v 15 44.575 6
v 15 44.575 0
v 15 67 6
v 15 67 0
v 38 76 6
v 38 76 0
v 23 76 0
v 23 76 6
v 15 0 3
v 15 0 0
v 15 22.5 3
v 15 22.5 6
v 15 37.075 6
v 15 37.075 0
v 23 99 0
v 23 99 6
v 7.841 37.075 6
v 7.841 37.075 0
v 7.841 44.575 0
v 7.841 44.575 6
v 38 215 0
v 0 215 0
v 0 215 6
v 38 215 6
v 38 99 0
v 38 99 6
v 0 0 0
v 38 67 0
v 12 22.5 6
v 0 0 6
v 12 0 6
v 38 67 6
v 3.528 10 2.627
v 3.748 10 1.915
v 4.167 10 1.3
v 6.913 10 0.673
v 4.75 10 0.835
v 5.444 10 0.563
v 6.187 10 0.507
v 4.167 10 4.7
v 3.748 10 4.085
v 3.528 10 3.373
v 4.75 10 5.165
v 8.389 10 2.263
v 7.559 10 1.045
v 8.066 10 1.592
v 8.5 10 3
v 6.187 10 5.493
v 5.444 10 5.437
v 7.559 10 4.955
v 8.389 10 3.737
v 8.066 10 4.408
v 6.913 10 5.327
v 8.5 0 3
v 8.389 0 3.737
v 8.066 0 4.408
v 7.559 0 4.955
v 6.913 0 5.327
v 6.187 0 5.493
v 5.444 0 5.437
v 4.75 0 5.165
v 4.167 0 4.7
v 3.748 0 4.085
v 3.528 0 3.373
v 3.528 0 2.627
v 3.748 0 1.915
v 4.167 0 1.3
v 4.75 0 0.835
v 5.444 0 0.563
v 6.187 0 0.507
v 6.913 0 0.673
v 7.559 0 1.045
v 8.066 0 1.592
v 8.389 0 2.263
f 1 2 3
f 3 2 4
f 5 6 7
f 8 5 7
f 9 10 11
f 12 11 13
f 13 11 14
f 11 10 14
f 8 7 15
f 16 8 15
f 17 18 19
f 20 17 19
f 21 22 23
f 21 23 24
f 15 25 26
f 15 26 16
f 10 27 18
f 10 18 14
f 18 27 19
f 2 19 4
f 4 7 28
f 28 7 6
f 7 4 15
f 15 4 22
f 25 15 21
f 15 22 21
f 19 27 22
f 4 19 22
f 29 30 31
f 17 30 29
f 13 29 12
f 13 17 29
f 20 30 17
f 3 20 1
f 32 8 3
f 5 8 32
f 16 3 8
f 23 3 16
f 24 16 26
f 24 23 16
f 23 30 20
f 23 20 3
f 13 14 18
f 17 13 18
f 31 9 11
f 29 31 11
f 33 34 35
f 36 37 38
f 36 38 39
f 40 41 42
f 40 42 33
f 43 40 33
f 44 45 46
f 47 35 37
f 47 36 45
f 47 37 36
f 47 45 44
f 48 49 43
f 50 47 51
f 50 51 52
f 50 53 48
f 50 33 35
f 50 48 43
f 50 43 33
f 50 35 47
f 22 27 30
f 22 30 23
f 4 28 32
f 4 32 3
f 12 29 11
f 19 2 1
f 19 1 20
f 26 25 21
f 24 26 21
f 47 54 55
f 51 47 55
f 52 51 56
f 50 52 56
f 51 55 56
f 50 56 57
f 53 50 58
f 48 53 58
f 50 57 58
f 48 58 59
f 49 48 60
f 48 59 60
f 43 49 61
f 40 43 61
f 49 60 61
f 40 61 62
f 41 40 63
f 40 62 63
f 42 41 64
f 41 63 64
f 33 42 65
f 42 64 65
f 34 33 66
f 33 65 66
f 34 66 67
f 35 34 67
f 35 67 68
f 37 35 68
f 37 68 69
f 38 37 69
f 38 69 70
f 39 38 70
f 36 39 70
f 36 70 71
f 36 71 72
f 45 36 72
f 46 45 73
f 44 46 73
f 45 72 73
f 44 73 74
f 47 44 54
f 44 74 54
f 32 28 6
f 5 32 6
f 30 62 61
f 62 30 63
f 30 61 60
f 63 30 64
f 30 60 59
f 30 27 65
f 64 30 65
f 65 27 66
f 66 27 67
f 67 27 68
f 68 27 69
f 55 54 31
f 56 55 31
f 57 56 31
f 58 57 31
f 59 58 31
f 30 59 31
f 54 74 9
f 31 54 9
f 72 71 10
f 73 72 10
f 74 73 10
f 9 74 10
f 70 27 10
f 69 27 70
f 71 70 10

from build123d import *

# Parameters (mm, degrees)
ESQUISSE1_W             = 38
ESQUISSE1_H             = 215
BOSS_EXTRU_1_DEPTH      = 6
ESQUISSE2_W             = 15
ESQUISSE2_H             = 23
ENL_V_MAT_EXTRU_1_DEPTH = 219.414743092
ESQUISSE3_W             = 20
ESQUISSE3_H             = 22.5
ENL_V_MAT_EXTRU_2_DEPTH = 7.5
CHANFREIN1_SIZE         = 6
ESQUISSE4_W             = 23
ESQUISSE4_H             = 67
ENL_V_MAT_EXTRU_3_DEPTH = 219.414743092
ESQUISSE5_W             = 7.158748458
ESQUISSE5_H             = 7.5
ENL_V_MAT_EXTRU_4_DEPTH = 219.414743092
ESQUISSE6_R             = 2.5
ENL_V_MAT_EXTRU_5_DEPTH = 10


with BuildPart() as part:
    # Esquisse1 → Boss.-Extru.1 (new body)
    with BuildSketch(Plane.XY):
        with Locations((19, 107.5)):
            Rectangle(ESQUISSE1_W, ESQUISSE1_H)
    extrude(amount=BOSS_EXTRU_1_DEPTH)

    # Esquisse2 → Enlèv. mat.-Extru.1 (cut, through all)
    with BuildSketch(Plane(origin=(0, 0, 0), x_dir=(-1, 0, 0), z_dir=(0, 0, -1))):
        with Locations((-30.5, 87.5)):
            Rectangle(ESQUISSE2_W, ESQUISSE2_H)
    extrude(amount=-ENL_V_MAT_EXTRU_1_DEPTH, mode=Mode.SUBTRACT)

    # Esquisse3 → Enlèv. mat.-Extru.2 (cut)
    with BuildSketch(Plane.XY.offset(6)):
        with Locations((28, 11.25)):
            Rectangle(ESQUISSE3_W, ESQUISSE3_H)
    extrude(amount=-ENL_V_MAT_EXTRU_2_DEPTH, mode=Mode.SUBTRACT)

    # Chanfrein1
    chanfrein1_edges = [part.edges().sort_by_distance(p)[0] for p in [
        (18, 11.25, 6),
    ]]
    chamfer(chanfrein1_edges, length=CHANFREIN1_SIZE - 0.0001)  # a hair under: the kernel refuses the full size

    # Esquisse4 → Enlèv. mat.-Extru.3 (cut, through all)
    with BuildSketch(Plane(origin=(0, 0, 0), x_dir=(-1, 0, 0), z_dir=(0, 0, -1))):
        with Locations((-26.5, 33.5)):
            Rectangle(ESQUISSE4_W, ESQUISSE4_H)
    extrude(amount=-ENL_V_MAT_EXTRU_3_DEPTH, mode=Mode.SUBTRACT)

    # Esquisse5 → Enlèv. mat.-Extru.4 (cut, through all)
    with BuildSketch(Plane(origin=(0, 0, 0), x_dir=(-1, 0, 0), z_dir=(0, 0, -1))):
        with Locations((-11.420625771, 40.825425785)):
            Rectangle(ESQUISSE5_W, ESQUISSE5_H)
    extrude(amount=-ENL_V_MAT_EXTRU_4_DEPTH, mode=Mode.SUBTRACT)

    # Esquisse6 → Enlèv. mat.-Extru.5 (cut)
    with BuildSketch(Plane(origin=(0, 0, 0), x_dir=(-1, 0, 0), z_dir=(0, -1, 0))):
        with Locations(Location((-6, -3, 0), (0, 0, 180))):
            Circle(ESQUISSE6_R)
    extrude(amount=-ENL_V_MAT_EXTRU_5_DEPTH, mode=Mode.SUBTRACT)


solid = part.part
